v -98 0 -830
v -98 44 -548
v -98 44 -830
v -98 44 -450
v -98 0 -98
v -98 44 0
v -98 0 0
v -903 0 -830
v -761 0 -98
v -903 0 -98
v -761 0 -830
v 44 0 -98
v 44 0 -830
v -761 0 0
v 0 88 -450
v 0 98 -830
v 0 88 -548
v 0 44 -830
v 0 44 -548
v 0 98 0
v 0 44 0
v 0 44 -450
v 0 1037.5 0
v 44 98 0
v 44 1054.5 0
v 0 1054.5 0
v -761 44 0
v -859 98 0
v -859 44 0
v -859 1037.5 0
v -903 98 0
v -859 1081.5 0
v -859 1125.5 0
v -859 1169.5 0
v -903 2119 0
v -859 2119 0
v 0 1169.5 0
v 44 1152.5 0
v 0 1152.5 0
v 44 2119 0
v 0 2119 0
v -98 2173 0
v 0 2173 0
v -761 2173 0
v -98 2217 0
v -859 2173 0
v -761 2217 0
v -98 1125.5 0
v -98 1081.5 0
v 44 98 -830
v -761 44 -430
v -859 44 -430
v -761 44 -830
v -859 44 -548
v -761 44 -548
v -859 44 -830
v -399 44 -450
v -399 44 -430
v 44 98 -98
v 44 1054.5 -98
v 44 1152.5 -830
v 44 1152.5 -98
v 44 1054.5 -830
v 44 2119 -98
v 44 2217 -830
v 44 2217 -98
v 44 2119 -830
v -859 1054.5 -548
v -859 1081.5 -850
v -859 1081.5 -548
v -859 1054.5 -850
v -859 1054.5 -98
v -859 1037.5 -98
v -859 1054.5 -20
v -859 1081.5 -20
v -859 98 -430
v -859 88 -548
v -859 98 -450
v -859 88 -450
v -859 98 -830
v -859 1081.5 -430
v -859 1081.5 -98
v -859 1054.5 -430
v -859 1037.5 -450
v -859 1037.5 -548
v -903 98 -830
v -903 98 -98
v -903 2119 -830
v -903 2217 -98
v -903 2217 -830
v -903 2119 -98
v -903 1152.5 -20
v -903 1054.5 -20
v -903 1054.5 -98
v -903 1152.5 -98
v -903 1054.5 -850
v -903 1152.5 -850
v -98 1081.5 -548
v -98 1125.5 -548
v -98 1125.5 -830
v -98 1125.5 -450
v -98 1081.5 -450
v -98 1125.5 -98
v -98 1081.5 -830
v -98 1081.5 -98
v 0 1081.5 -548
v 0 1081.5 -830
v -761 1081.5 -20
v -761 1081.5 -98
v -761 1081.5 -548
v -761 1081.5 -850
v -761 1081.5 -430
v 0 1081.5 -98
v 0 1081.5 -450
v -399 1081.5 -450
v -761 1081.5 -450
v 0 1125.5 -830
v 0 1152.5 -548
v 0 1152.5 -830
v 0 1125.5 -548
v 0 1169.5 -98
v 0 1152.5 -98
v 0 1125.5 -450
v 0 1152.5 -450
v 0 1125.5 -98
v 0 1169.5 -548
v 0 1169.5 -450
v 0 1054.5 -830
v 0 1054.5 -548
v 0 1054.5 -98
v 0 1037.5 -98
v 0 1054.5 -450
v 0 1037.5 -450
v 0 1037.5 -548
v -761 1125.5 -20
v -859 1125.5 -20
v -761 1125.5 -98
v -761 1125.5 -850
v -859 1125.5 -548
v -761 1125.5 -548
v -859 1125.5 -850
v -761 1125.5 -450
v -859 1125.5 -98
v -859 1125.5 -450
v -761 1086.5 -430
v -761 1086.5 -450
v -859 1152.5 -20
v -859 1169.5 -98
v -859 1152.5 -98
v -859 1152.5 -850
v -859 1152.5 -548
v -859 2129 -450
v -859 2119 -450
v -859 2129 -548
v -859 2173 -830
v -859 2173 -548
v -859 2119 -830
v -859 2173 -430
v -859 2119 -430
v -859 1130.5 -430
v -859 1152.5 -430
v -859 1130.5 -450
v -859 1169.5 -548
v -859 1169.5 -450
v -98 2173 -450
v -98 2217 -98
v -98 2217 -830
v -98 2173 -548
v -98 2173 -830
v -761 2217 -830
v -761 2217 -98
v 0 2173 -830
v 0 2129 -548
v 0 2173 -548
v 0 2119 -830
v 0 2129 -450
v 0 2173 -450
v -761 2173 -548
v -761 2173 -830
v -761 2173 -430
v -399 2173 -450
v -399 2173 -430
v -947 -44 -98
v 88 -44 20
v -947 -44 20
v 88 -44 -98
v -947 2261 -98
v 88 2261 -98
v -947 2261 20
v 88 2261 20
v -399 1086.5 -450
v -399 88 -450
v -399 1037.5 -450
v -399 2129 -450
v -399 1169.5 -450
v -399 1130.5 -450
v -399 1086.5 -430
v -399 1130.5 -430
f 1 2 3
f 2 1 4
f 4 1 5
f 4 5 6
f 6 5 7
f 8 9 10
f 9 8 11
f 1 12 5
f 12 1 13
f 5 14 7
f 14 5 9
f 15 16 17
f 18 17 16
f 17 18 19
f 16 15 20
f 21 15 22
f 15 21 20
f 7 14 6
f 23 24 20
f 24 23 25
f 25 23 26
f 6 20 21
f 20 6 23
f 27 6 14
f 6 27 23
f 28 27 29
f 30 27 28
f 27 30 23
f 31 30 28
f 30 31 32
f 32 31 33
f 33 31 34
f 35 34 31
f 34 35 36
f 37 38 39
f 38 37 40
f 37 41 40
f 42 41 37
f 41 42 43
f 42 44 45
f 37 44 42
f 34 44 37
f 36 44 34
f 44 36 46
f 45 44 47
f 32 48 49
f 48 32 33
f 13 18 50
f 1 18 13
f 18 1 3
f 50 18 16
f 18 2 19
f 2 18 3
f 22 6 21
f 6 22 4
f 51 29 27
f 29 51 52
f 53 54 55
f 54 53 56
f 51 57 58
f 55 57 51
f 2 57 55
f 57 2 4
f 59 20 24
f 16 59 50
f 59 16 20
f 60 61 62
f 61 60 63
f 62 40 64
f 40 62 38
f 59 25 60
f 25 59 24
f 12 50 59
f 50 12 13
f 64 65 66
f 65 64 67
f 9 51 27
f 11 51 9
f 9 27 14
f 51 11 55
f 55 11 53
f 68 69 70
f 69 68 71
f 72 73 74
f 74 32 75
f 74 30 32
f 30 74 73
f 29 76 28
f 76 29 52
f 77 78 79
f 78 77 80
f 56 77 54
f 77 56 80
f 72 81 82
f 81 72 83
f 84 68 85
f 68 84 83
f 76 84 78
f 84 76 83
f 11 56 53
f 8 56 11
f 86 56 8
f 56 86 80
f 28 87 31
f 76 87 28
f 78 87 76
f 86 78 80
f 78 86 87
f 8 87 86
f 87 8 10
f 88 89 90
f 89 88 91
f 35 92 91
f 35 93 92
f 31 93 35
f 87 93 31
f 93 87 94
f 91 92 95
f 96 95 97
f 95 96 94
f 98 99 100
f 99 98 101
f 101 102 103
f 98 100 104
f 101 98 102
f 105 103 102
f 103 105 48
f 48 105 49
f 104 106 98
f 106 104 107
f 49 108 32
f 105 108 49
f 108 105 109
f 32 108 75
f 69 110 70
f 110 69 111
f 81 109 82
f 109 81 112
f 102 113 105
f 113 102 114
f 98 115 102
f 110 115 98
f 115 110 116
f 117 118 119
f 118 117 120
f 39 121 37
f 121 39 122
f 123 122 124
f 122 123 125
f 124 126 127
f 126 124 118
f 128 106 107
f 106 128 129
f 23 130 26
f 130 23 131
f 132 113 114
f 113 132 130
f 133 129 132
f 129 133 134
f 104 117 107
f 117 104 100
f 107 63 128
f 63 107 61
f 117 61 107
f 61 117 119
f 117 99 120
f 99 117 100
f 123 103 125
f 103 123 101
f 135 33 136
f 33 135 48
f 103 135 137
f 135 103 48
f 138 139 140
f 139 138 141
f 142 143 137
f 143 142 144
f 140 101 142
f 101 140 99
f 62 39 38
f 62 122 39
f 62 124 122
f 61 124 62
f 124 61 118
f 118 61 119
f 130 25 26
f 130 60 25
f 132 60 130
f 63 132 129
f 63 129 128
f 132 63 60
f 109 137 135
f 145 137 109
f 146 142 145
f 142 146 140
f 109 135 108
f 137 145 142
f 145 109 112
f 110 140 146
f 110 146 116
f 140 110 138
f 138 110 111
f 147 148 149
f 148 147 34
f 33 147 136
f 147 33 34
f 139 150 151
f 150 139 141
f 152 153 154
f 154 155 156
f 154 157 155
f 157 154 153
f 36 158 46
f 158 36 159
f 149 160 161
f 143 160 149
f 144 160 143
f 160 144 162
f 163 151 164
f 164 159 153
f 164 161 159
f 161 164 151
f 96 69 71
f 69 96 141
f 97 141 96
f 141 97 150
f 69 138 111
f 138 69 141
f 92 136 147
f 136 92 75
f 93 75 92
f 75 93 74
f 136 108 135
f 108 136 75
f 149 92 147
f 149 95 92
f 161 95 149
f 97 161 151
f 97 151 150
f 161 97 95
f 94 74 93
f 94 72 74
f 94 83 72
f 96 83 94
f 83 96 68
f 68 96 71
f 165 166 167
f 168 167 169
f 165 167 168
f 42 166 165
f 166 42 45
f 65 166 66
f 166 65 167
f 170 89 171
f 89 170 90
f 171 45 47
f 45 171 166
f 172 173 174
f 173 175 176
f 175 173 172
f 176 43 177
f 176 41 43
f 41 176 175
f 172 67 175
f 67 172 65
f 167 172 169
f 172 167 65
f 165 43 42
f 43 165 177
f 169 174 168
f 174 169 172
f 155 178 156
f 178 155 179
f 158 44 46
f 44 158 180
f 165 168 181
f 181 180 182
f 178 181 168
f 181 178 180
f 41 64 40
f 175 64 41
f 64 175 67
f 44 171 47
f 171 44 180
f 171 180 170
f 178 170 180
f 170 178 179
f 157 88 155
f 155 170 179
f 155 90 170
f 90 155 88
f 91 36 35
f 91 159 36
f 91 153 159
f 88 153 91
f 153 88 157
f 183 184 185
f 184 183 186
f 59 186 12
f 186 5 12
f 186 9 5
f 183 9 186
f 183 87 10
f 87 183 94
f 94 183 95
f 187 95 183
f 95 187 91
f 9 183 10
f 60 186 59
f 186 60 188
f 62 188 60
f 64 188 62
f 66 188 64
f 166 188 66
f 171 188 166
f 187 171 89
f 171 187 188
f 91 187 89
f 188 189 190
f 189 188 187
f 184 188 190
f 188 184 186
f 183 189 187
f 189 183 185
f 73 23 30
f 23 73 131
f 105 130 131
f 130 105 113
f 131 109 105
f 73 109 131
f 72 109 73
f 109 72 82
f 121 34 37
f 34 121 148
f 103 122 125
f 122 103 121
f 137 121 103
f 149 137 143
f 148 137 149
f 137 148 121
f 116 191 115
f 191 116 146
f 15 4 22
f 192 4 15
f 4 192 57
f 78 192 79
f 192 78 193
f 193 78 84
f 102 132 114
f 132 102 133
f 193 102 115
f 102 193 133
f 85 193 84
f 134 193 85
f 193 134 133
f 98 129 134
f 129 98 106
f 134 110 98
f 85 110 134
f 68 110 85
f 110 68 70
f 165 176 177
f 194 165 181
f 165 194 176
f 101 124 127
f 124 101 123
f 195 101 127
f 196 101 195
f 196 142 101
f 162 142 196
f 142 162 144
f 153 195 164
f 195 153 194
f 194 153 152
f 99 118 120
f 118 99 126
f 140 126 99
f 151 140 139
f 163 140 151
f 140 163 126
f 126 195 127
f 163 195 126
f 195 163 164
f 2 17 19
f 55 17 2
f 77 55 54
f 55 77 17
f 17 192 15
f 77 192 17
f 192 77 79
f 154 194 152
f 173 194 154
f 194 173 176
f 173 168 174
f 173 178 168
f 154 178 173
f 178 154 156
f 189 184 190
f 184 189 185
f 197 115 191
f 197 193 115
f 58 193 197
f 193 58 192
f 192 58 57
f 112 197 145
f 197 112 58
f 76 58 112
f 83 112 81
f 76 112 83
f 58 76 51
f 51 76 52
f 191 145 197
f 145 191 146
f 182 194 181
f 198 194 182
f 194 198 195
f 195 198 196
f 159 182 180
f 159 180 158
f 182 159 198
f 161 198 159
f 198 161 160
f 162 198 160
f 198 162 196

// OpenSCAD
// The measurements of the table
tableHeight = 850;
tableWidth = 1035;
tableLength = 2305;

topThickness = 20;

// Measurements of the available planks
plankWidth = 44;
plankHeight = 98;

// How much space should there be for your feet
footSpace = 399;

// At which height from the bottom should the shelves be
shelfHeight = 400;

module plank(width, depth, length) {
	cube([width, length, depth]);
}

module foot(width, depth, length) {	
	rotate([270, 0, 90])
		plank(width, depth, length);
	rotate([270, 0, 0])
		plank(width, depth, length);
}

module foot_t(width, depth, length) {
	translate([0, depth / 2 -(width / 2), 0])
		rotate([270, 0, 90])
			plank(width, depth, length);
	rotate([270, 0, 0])
		plank(width, depth, length);
}


// Calculated values
footHeight = tableHeight - topThickness;
innerWidth = tableWidth - plankWidth * 4;
outerWidth = tableWidth - plankWidth * 2;
bottomPlateLength = (tableLength - plankWidth * 5) / 2;

// Print the needed parts
echo("Plates:");
echo("1  x", tableWidth, " x ", tableLength, " x ", topThickness, "mm");
echo("2  x", innerWidth - footSpace, " x ", bottomPlateLength, " x ", topThickness, "mm");

echo("Planks:");
echo("2  x ", plankHeight, " x ", plankWidth, " x ", tableLength, "mm");
echo("2  x ", plankHeight, " x ", plankWidth, " x ", tableWidth - (plankWidth * 2));
echo("12 x ", plankHeight, " x ", plankWidth, " x ", footHeight, "mm");

echo("6  x ", plankHeight, " x ", plankWidth, " x ", innerWidth, "mm");

// front left
foot(plankWidth, plankHeight, footHeight);

// back left
translate([-(tableWidth - plankWidth * 4), 0, -footHeight])
	rotate([180, 0, 180])
		foot(plankWidth, plankHeight, footHeight);

// front center
translate([0, tableLength / 2 - plankHeight, 0])
		foot_t(plankWidth, plankHeight, footHeight);

// back center
translate([-tableWidth + plankWidth * 4, tableLength / 2 - plankHeight, -tableHeight])
	rotate([0, 180, 0])
		foot_t(plankWidth, plankHeight, footHeight);

translate([0, tableLength - plankWidth * 2, -footHeight]) {
	rotate([180, 0, 0]) {
		// front right
		foot(plankWidth, plankHeight, footHeight);

		// back right
		translate([-tableWidth + plankWidth * 4, 0, -footHeight])
			rotate([180, 0, 180])
				foot(plankWidth, plankHeight, footHeight);
	}
}

// Outer connection
color("black", 0.5) {
	// connection left
	translate([plankWidth, -plankWidth, -plankHeight])
		rotate([0, 0, 90])
			plank(plankWidth, plankHeight, tableWidth - plankWidth * 2);

	// connection right
	translate([plankWidth, -plankWidth * 2 + tableLength, -plankHeight])
		rotate([0, 0, 90])
			plank(plankWidth, plankHeight, tableWidth - plankWidth * 2);

	// connection front
	translate([plankWidth, -plankWidth, -plankHeight])
		plank(plankWidth, plankHeight, tableLength);

	// connection back
	translate([-tableWidth + plankWidth * 2, -plankWidth, -plankHeight])
		plank(plankWidth, plankHeight, tableLength);
}

// inner connection
color("red", 0.4) {
	// center left top
	translate([0, tableLength / 2 -plankWidth - plankHeight / 2 - plankWidth / 2, -plankHeight])
		rotate([0,0,90])
			plank(plankWidth, plankHeight, innerWidth);
	
	// center right top
	translate([0, tableLength / 2 -plankWidth - plankHeight / 2 - plankWidth / 2 + plankWidth * 2, -plankHeight])
		rotate([0,0,90])
			plank(plankWidth, plankHeight, innerWidth);

	// center left center
	translate([0, tableLength / 2 -plankWidth - plankHeight / 2 - plankWidth / 2, -(tableHeight - shelfHeight + plankHeight)])
		rotate([0,0,90])
			plank(plankWidth, plankHeight, innerWidth);
	
	// center right center
	translate([0, tableLength / 2 -plankWidth - plankHeight / 2 - plankWidth / 2 + plankWidth * 2, -(tableHeight - shelfHeight + plankHeight)])
		rotate([0,0,90])
			plank(plankWidth, plankHeight, innerWidth);

	// left center
	translate([0, plankWidth,-(tableHeight - shelfHeight + plankHeight)])
		rotate([0, 0, 90])
			plank(plankWidth, plankHeight, innerWidth);
	
	// right center
	translate([0, tableLength -plankWidth * 4, -(tableHeight - shelfHeight + plankHeight)])
		rotate([0,0,90])
			plank(plankWidth, plankHeight, innerWidth);
}

color("green", 0.5) {
	// top
	translate([-tableWidth + plankWidth * 2, -plankWidth, 0])
		cube([tableWidth, tableLength, topThickness]);

	// left shelf
	translate([-tableWidth + plankWidth * 4, plankWidth, -(tableHeight - shelfHeight)])
		cube([innerWidth - footSpace, bottomPlateLength, topThickness]);

	// right shelf
	translate([-tableWidth + plankWidth * 4, tableLength / 2 - plankWidth / 2, -(tableHeight - shelfHeight)])
		cube([innerWidth - footSpace, bottomPlateLength, topThickness]);
}
